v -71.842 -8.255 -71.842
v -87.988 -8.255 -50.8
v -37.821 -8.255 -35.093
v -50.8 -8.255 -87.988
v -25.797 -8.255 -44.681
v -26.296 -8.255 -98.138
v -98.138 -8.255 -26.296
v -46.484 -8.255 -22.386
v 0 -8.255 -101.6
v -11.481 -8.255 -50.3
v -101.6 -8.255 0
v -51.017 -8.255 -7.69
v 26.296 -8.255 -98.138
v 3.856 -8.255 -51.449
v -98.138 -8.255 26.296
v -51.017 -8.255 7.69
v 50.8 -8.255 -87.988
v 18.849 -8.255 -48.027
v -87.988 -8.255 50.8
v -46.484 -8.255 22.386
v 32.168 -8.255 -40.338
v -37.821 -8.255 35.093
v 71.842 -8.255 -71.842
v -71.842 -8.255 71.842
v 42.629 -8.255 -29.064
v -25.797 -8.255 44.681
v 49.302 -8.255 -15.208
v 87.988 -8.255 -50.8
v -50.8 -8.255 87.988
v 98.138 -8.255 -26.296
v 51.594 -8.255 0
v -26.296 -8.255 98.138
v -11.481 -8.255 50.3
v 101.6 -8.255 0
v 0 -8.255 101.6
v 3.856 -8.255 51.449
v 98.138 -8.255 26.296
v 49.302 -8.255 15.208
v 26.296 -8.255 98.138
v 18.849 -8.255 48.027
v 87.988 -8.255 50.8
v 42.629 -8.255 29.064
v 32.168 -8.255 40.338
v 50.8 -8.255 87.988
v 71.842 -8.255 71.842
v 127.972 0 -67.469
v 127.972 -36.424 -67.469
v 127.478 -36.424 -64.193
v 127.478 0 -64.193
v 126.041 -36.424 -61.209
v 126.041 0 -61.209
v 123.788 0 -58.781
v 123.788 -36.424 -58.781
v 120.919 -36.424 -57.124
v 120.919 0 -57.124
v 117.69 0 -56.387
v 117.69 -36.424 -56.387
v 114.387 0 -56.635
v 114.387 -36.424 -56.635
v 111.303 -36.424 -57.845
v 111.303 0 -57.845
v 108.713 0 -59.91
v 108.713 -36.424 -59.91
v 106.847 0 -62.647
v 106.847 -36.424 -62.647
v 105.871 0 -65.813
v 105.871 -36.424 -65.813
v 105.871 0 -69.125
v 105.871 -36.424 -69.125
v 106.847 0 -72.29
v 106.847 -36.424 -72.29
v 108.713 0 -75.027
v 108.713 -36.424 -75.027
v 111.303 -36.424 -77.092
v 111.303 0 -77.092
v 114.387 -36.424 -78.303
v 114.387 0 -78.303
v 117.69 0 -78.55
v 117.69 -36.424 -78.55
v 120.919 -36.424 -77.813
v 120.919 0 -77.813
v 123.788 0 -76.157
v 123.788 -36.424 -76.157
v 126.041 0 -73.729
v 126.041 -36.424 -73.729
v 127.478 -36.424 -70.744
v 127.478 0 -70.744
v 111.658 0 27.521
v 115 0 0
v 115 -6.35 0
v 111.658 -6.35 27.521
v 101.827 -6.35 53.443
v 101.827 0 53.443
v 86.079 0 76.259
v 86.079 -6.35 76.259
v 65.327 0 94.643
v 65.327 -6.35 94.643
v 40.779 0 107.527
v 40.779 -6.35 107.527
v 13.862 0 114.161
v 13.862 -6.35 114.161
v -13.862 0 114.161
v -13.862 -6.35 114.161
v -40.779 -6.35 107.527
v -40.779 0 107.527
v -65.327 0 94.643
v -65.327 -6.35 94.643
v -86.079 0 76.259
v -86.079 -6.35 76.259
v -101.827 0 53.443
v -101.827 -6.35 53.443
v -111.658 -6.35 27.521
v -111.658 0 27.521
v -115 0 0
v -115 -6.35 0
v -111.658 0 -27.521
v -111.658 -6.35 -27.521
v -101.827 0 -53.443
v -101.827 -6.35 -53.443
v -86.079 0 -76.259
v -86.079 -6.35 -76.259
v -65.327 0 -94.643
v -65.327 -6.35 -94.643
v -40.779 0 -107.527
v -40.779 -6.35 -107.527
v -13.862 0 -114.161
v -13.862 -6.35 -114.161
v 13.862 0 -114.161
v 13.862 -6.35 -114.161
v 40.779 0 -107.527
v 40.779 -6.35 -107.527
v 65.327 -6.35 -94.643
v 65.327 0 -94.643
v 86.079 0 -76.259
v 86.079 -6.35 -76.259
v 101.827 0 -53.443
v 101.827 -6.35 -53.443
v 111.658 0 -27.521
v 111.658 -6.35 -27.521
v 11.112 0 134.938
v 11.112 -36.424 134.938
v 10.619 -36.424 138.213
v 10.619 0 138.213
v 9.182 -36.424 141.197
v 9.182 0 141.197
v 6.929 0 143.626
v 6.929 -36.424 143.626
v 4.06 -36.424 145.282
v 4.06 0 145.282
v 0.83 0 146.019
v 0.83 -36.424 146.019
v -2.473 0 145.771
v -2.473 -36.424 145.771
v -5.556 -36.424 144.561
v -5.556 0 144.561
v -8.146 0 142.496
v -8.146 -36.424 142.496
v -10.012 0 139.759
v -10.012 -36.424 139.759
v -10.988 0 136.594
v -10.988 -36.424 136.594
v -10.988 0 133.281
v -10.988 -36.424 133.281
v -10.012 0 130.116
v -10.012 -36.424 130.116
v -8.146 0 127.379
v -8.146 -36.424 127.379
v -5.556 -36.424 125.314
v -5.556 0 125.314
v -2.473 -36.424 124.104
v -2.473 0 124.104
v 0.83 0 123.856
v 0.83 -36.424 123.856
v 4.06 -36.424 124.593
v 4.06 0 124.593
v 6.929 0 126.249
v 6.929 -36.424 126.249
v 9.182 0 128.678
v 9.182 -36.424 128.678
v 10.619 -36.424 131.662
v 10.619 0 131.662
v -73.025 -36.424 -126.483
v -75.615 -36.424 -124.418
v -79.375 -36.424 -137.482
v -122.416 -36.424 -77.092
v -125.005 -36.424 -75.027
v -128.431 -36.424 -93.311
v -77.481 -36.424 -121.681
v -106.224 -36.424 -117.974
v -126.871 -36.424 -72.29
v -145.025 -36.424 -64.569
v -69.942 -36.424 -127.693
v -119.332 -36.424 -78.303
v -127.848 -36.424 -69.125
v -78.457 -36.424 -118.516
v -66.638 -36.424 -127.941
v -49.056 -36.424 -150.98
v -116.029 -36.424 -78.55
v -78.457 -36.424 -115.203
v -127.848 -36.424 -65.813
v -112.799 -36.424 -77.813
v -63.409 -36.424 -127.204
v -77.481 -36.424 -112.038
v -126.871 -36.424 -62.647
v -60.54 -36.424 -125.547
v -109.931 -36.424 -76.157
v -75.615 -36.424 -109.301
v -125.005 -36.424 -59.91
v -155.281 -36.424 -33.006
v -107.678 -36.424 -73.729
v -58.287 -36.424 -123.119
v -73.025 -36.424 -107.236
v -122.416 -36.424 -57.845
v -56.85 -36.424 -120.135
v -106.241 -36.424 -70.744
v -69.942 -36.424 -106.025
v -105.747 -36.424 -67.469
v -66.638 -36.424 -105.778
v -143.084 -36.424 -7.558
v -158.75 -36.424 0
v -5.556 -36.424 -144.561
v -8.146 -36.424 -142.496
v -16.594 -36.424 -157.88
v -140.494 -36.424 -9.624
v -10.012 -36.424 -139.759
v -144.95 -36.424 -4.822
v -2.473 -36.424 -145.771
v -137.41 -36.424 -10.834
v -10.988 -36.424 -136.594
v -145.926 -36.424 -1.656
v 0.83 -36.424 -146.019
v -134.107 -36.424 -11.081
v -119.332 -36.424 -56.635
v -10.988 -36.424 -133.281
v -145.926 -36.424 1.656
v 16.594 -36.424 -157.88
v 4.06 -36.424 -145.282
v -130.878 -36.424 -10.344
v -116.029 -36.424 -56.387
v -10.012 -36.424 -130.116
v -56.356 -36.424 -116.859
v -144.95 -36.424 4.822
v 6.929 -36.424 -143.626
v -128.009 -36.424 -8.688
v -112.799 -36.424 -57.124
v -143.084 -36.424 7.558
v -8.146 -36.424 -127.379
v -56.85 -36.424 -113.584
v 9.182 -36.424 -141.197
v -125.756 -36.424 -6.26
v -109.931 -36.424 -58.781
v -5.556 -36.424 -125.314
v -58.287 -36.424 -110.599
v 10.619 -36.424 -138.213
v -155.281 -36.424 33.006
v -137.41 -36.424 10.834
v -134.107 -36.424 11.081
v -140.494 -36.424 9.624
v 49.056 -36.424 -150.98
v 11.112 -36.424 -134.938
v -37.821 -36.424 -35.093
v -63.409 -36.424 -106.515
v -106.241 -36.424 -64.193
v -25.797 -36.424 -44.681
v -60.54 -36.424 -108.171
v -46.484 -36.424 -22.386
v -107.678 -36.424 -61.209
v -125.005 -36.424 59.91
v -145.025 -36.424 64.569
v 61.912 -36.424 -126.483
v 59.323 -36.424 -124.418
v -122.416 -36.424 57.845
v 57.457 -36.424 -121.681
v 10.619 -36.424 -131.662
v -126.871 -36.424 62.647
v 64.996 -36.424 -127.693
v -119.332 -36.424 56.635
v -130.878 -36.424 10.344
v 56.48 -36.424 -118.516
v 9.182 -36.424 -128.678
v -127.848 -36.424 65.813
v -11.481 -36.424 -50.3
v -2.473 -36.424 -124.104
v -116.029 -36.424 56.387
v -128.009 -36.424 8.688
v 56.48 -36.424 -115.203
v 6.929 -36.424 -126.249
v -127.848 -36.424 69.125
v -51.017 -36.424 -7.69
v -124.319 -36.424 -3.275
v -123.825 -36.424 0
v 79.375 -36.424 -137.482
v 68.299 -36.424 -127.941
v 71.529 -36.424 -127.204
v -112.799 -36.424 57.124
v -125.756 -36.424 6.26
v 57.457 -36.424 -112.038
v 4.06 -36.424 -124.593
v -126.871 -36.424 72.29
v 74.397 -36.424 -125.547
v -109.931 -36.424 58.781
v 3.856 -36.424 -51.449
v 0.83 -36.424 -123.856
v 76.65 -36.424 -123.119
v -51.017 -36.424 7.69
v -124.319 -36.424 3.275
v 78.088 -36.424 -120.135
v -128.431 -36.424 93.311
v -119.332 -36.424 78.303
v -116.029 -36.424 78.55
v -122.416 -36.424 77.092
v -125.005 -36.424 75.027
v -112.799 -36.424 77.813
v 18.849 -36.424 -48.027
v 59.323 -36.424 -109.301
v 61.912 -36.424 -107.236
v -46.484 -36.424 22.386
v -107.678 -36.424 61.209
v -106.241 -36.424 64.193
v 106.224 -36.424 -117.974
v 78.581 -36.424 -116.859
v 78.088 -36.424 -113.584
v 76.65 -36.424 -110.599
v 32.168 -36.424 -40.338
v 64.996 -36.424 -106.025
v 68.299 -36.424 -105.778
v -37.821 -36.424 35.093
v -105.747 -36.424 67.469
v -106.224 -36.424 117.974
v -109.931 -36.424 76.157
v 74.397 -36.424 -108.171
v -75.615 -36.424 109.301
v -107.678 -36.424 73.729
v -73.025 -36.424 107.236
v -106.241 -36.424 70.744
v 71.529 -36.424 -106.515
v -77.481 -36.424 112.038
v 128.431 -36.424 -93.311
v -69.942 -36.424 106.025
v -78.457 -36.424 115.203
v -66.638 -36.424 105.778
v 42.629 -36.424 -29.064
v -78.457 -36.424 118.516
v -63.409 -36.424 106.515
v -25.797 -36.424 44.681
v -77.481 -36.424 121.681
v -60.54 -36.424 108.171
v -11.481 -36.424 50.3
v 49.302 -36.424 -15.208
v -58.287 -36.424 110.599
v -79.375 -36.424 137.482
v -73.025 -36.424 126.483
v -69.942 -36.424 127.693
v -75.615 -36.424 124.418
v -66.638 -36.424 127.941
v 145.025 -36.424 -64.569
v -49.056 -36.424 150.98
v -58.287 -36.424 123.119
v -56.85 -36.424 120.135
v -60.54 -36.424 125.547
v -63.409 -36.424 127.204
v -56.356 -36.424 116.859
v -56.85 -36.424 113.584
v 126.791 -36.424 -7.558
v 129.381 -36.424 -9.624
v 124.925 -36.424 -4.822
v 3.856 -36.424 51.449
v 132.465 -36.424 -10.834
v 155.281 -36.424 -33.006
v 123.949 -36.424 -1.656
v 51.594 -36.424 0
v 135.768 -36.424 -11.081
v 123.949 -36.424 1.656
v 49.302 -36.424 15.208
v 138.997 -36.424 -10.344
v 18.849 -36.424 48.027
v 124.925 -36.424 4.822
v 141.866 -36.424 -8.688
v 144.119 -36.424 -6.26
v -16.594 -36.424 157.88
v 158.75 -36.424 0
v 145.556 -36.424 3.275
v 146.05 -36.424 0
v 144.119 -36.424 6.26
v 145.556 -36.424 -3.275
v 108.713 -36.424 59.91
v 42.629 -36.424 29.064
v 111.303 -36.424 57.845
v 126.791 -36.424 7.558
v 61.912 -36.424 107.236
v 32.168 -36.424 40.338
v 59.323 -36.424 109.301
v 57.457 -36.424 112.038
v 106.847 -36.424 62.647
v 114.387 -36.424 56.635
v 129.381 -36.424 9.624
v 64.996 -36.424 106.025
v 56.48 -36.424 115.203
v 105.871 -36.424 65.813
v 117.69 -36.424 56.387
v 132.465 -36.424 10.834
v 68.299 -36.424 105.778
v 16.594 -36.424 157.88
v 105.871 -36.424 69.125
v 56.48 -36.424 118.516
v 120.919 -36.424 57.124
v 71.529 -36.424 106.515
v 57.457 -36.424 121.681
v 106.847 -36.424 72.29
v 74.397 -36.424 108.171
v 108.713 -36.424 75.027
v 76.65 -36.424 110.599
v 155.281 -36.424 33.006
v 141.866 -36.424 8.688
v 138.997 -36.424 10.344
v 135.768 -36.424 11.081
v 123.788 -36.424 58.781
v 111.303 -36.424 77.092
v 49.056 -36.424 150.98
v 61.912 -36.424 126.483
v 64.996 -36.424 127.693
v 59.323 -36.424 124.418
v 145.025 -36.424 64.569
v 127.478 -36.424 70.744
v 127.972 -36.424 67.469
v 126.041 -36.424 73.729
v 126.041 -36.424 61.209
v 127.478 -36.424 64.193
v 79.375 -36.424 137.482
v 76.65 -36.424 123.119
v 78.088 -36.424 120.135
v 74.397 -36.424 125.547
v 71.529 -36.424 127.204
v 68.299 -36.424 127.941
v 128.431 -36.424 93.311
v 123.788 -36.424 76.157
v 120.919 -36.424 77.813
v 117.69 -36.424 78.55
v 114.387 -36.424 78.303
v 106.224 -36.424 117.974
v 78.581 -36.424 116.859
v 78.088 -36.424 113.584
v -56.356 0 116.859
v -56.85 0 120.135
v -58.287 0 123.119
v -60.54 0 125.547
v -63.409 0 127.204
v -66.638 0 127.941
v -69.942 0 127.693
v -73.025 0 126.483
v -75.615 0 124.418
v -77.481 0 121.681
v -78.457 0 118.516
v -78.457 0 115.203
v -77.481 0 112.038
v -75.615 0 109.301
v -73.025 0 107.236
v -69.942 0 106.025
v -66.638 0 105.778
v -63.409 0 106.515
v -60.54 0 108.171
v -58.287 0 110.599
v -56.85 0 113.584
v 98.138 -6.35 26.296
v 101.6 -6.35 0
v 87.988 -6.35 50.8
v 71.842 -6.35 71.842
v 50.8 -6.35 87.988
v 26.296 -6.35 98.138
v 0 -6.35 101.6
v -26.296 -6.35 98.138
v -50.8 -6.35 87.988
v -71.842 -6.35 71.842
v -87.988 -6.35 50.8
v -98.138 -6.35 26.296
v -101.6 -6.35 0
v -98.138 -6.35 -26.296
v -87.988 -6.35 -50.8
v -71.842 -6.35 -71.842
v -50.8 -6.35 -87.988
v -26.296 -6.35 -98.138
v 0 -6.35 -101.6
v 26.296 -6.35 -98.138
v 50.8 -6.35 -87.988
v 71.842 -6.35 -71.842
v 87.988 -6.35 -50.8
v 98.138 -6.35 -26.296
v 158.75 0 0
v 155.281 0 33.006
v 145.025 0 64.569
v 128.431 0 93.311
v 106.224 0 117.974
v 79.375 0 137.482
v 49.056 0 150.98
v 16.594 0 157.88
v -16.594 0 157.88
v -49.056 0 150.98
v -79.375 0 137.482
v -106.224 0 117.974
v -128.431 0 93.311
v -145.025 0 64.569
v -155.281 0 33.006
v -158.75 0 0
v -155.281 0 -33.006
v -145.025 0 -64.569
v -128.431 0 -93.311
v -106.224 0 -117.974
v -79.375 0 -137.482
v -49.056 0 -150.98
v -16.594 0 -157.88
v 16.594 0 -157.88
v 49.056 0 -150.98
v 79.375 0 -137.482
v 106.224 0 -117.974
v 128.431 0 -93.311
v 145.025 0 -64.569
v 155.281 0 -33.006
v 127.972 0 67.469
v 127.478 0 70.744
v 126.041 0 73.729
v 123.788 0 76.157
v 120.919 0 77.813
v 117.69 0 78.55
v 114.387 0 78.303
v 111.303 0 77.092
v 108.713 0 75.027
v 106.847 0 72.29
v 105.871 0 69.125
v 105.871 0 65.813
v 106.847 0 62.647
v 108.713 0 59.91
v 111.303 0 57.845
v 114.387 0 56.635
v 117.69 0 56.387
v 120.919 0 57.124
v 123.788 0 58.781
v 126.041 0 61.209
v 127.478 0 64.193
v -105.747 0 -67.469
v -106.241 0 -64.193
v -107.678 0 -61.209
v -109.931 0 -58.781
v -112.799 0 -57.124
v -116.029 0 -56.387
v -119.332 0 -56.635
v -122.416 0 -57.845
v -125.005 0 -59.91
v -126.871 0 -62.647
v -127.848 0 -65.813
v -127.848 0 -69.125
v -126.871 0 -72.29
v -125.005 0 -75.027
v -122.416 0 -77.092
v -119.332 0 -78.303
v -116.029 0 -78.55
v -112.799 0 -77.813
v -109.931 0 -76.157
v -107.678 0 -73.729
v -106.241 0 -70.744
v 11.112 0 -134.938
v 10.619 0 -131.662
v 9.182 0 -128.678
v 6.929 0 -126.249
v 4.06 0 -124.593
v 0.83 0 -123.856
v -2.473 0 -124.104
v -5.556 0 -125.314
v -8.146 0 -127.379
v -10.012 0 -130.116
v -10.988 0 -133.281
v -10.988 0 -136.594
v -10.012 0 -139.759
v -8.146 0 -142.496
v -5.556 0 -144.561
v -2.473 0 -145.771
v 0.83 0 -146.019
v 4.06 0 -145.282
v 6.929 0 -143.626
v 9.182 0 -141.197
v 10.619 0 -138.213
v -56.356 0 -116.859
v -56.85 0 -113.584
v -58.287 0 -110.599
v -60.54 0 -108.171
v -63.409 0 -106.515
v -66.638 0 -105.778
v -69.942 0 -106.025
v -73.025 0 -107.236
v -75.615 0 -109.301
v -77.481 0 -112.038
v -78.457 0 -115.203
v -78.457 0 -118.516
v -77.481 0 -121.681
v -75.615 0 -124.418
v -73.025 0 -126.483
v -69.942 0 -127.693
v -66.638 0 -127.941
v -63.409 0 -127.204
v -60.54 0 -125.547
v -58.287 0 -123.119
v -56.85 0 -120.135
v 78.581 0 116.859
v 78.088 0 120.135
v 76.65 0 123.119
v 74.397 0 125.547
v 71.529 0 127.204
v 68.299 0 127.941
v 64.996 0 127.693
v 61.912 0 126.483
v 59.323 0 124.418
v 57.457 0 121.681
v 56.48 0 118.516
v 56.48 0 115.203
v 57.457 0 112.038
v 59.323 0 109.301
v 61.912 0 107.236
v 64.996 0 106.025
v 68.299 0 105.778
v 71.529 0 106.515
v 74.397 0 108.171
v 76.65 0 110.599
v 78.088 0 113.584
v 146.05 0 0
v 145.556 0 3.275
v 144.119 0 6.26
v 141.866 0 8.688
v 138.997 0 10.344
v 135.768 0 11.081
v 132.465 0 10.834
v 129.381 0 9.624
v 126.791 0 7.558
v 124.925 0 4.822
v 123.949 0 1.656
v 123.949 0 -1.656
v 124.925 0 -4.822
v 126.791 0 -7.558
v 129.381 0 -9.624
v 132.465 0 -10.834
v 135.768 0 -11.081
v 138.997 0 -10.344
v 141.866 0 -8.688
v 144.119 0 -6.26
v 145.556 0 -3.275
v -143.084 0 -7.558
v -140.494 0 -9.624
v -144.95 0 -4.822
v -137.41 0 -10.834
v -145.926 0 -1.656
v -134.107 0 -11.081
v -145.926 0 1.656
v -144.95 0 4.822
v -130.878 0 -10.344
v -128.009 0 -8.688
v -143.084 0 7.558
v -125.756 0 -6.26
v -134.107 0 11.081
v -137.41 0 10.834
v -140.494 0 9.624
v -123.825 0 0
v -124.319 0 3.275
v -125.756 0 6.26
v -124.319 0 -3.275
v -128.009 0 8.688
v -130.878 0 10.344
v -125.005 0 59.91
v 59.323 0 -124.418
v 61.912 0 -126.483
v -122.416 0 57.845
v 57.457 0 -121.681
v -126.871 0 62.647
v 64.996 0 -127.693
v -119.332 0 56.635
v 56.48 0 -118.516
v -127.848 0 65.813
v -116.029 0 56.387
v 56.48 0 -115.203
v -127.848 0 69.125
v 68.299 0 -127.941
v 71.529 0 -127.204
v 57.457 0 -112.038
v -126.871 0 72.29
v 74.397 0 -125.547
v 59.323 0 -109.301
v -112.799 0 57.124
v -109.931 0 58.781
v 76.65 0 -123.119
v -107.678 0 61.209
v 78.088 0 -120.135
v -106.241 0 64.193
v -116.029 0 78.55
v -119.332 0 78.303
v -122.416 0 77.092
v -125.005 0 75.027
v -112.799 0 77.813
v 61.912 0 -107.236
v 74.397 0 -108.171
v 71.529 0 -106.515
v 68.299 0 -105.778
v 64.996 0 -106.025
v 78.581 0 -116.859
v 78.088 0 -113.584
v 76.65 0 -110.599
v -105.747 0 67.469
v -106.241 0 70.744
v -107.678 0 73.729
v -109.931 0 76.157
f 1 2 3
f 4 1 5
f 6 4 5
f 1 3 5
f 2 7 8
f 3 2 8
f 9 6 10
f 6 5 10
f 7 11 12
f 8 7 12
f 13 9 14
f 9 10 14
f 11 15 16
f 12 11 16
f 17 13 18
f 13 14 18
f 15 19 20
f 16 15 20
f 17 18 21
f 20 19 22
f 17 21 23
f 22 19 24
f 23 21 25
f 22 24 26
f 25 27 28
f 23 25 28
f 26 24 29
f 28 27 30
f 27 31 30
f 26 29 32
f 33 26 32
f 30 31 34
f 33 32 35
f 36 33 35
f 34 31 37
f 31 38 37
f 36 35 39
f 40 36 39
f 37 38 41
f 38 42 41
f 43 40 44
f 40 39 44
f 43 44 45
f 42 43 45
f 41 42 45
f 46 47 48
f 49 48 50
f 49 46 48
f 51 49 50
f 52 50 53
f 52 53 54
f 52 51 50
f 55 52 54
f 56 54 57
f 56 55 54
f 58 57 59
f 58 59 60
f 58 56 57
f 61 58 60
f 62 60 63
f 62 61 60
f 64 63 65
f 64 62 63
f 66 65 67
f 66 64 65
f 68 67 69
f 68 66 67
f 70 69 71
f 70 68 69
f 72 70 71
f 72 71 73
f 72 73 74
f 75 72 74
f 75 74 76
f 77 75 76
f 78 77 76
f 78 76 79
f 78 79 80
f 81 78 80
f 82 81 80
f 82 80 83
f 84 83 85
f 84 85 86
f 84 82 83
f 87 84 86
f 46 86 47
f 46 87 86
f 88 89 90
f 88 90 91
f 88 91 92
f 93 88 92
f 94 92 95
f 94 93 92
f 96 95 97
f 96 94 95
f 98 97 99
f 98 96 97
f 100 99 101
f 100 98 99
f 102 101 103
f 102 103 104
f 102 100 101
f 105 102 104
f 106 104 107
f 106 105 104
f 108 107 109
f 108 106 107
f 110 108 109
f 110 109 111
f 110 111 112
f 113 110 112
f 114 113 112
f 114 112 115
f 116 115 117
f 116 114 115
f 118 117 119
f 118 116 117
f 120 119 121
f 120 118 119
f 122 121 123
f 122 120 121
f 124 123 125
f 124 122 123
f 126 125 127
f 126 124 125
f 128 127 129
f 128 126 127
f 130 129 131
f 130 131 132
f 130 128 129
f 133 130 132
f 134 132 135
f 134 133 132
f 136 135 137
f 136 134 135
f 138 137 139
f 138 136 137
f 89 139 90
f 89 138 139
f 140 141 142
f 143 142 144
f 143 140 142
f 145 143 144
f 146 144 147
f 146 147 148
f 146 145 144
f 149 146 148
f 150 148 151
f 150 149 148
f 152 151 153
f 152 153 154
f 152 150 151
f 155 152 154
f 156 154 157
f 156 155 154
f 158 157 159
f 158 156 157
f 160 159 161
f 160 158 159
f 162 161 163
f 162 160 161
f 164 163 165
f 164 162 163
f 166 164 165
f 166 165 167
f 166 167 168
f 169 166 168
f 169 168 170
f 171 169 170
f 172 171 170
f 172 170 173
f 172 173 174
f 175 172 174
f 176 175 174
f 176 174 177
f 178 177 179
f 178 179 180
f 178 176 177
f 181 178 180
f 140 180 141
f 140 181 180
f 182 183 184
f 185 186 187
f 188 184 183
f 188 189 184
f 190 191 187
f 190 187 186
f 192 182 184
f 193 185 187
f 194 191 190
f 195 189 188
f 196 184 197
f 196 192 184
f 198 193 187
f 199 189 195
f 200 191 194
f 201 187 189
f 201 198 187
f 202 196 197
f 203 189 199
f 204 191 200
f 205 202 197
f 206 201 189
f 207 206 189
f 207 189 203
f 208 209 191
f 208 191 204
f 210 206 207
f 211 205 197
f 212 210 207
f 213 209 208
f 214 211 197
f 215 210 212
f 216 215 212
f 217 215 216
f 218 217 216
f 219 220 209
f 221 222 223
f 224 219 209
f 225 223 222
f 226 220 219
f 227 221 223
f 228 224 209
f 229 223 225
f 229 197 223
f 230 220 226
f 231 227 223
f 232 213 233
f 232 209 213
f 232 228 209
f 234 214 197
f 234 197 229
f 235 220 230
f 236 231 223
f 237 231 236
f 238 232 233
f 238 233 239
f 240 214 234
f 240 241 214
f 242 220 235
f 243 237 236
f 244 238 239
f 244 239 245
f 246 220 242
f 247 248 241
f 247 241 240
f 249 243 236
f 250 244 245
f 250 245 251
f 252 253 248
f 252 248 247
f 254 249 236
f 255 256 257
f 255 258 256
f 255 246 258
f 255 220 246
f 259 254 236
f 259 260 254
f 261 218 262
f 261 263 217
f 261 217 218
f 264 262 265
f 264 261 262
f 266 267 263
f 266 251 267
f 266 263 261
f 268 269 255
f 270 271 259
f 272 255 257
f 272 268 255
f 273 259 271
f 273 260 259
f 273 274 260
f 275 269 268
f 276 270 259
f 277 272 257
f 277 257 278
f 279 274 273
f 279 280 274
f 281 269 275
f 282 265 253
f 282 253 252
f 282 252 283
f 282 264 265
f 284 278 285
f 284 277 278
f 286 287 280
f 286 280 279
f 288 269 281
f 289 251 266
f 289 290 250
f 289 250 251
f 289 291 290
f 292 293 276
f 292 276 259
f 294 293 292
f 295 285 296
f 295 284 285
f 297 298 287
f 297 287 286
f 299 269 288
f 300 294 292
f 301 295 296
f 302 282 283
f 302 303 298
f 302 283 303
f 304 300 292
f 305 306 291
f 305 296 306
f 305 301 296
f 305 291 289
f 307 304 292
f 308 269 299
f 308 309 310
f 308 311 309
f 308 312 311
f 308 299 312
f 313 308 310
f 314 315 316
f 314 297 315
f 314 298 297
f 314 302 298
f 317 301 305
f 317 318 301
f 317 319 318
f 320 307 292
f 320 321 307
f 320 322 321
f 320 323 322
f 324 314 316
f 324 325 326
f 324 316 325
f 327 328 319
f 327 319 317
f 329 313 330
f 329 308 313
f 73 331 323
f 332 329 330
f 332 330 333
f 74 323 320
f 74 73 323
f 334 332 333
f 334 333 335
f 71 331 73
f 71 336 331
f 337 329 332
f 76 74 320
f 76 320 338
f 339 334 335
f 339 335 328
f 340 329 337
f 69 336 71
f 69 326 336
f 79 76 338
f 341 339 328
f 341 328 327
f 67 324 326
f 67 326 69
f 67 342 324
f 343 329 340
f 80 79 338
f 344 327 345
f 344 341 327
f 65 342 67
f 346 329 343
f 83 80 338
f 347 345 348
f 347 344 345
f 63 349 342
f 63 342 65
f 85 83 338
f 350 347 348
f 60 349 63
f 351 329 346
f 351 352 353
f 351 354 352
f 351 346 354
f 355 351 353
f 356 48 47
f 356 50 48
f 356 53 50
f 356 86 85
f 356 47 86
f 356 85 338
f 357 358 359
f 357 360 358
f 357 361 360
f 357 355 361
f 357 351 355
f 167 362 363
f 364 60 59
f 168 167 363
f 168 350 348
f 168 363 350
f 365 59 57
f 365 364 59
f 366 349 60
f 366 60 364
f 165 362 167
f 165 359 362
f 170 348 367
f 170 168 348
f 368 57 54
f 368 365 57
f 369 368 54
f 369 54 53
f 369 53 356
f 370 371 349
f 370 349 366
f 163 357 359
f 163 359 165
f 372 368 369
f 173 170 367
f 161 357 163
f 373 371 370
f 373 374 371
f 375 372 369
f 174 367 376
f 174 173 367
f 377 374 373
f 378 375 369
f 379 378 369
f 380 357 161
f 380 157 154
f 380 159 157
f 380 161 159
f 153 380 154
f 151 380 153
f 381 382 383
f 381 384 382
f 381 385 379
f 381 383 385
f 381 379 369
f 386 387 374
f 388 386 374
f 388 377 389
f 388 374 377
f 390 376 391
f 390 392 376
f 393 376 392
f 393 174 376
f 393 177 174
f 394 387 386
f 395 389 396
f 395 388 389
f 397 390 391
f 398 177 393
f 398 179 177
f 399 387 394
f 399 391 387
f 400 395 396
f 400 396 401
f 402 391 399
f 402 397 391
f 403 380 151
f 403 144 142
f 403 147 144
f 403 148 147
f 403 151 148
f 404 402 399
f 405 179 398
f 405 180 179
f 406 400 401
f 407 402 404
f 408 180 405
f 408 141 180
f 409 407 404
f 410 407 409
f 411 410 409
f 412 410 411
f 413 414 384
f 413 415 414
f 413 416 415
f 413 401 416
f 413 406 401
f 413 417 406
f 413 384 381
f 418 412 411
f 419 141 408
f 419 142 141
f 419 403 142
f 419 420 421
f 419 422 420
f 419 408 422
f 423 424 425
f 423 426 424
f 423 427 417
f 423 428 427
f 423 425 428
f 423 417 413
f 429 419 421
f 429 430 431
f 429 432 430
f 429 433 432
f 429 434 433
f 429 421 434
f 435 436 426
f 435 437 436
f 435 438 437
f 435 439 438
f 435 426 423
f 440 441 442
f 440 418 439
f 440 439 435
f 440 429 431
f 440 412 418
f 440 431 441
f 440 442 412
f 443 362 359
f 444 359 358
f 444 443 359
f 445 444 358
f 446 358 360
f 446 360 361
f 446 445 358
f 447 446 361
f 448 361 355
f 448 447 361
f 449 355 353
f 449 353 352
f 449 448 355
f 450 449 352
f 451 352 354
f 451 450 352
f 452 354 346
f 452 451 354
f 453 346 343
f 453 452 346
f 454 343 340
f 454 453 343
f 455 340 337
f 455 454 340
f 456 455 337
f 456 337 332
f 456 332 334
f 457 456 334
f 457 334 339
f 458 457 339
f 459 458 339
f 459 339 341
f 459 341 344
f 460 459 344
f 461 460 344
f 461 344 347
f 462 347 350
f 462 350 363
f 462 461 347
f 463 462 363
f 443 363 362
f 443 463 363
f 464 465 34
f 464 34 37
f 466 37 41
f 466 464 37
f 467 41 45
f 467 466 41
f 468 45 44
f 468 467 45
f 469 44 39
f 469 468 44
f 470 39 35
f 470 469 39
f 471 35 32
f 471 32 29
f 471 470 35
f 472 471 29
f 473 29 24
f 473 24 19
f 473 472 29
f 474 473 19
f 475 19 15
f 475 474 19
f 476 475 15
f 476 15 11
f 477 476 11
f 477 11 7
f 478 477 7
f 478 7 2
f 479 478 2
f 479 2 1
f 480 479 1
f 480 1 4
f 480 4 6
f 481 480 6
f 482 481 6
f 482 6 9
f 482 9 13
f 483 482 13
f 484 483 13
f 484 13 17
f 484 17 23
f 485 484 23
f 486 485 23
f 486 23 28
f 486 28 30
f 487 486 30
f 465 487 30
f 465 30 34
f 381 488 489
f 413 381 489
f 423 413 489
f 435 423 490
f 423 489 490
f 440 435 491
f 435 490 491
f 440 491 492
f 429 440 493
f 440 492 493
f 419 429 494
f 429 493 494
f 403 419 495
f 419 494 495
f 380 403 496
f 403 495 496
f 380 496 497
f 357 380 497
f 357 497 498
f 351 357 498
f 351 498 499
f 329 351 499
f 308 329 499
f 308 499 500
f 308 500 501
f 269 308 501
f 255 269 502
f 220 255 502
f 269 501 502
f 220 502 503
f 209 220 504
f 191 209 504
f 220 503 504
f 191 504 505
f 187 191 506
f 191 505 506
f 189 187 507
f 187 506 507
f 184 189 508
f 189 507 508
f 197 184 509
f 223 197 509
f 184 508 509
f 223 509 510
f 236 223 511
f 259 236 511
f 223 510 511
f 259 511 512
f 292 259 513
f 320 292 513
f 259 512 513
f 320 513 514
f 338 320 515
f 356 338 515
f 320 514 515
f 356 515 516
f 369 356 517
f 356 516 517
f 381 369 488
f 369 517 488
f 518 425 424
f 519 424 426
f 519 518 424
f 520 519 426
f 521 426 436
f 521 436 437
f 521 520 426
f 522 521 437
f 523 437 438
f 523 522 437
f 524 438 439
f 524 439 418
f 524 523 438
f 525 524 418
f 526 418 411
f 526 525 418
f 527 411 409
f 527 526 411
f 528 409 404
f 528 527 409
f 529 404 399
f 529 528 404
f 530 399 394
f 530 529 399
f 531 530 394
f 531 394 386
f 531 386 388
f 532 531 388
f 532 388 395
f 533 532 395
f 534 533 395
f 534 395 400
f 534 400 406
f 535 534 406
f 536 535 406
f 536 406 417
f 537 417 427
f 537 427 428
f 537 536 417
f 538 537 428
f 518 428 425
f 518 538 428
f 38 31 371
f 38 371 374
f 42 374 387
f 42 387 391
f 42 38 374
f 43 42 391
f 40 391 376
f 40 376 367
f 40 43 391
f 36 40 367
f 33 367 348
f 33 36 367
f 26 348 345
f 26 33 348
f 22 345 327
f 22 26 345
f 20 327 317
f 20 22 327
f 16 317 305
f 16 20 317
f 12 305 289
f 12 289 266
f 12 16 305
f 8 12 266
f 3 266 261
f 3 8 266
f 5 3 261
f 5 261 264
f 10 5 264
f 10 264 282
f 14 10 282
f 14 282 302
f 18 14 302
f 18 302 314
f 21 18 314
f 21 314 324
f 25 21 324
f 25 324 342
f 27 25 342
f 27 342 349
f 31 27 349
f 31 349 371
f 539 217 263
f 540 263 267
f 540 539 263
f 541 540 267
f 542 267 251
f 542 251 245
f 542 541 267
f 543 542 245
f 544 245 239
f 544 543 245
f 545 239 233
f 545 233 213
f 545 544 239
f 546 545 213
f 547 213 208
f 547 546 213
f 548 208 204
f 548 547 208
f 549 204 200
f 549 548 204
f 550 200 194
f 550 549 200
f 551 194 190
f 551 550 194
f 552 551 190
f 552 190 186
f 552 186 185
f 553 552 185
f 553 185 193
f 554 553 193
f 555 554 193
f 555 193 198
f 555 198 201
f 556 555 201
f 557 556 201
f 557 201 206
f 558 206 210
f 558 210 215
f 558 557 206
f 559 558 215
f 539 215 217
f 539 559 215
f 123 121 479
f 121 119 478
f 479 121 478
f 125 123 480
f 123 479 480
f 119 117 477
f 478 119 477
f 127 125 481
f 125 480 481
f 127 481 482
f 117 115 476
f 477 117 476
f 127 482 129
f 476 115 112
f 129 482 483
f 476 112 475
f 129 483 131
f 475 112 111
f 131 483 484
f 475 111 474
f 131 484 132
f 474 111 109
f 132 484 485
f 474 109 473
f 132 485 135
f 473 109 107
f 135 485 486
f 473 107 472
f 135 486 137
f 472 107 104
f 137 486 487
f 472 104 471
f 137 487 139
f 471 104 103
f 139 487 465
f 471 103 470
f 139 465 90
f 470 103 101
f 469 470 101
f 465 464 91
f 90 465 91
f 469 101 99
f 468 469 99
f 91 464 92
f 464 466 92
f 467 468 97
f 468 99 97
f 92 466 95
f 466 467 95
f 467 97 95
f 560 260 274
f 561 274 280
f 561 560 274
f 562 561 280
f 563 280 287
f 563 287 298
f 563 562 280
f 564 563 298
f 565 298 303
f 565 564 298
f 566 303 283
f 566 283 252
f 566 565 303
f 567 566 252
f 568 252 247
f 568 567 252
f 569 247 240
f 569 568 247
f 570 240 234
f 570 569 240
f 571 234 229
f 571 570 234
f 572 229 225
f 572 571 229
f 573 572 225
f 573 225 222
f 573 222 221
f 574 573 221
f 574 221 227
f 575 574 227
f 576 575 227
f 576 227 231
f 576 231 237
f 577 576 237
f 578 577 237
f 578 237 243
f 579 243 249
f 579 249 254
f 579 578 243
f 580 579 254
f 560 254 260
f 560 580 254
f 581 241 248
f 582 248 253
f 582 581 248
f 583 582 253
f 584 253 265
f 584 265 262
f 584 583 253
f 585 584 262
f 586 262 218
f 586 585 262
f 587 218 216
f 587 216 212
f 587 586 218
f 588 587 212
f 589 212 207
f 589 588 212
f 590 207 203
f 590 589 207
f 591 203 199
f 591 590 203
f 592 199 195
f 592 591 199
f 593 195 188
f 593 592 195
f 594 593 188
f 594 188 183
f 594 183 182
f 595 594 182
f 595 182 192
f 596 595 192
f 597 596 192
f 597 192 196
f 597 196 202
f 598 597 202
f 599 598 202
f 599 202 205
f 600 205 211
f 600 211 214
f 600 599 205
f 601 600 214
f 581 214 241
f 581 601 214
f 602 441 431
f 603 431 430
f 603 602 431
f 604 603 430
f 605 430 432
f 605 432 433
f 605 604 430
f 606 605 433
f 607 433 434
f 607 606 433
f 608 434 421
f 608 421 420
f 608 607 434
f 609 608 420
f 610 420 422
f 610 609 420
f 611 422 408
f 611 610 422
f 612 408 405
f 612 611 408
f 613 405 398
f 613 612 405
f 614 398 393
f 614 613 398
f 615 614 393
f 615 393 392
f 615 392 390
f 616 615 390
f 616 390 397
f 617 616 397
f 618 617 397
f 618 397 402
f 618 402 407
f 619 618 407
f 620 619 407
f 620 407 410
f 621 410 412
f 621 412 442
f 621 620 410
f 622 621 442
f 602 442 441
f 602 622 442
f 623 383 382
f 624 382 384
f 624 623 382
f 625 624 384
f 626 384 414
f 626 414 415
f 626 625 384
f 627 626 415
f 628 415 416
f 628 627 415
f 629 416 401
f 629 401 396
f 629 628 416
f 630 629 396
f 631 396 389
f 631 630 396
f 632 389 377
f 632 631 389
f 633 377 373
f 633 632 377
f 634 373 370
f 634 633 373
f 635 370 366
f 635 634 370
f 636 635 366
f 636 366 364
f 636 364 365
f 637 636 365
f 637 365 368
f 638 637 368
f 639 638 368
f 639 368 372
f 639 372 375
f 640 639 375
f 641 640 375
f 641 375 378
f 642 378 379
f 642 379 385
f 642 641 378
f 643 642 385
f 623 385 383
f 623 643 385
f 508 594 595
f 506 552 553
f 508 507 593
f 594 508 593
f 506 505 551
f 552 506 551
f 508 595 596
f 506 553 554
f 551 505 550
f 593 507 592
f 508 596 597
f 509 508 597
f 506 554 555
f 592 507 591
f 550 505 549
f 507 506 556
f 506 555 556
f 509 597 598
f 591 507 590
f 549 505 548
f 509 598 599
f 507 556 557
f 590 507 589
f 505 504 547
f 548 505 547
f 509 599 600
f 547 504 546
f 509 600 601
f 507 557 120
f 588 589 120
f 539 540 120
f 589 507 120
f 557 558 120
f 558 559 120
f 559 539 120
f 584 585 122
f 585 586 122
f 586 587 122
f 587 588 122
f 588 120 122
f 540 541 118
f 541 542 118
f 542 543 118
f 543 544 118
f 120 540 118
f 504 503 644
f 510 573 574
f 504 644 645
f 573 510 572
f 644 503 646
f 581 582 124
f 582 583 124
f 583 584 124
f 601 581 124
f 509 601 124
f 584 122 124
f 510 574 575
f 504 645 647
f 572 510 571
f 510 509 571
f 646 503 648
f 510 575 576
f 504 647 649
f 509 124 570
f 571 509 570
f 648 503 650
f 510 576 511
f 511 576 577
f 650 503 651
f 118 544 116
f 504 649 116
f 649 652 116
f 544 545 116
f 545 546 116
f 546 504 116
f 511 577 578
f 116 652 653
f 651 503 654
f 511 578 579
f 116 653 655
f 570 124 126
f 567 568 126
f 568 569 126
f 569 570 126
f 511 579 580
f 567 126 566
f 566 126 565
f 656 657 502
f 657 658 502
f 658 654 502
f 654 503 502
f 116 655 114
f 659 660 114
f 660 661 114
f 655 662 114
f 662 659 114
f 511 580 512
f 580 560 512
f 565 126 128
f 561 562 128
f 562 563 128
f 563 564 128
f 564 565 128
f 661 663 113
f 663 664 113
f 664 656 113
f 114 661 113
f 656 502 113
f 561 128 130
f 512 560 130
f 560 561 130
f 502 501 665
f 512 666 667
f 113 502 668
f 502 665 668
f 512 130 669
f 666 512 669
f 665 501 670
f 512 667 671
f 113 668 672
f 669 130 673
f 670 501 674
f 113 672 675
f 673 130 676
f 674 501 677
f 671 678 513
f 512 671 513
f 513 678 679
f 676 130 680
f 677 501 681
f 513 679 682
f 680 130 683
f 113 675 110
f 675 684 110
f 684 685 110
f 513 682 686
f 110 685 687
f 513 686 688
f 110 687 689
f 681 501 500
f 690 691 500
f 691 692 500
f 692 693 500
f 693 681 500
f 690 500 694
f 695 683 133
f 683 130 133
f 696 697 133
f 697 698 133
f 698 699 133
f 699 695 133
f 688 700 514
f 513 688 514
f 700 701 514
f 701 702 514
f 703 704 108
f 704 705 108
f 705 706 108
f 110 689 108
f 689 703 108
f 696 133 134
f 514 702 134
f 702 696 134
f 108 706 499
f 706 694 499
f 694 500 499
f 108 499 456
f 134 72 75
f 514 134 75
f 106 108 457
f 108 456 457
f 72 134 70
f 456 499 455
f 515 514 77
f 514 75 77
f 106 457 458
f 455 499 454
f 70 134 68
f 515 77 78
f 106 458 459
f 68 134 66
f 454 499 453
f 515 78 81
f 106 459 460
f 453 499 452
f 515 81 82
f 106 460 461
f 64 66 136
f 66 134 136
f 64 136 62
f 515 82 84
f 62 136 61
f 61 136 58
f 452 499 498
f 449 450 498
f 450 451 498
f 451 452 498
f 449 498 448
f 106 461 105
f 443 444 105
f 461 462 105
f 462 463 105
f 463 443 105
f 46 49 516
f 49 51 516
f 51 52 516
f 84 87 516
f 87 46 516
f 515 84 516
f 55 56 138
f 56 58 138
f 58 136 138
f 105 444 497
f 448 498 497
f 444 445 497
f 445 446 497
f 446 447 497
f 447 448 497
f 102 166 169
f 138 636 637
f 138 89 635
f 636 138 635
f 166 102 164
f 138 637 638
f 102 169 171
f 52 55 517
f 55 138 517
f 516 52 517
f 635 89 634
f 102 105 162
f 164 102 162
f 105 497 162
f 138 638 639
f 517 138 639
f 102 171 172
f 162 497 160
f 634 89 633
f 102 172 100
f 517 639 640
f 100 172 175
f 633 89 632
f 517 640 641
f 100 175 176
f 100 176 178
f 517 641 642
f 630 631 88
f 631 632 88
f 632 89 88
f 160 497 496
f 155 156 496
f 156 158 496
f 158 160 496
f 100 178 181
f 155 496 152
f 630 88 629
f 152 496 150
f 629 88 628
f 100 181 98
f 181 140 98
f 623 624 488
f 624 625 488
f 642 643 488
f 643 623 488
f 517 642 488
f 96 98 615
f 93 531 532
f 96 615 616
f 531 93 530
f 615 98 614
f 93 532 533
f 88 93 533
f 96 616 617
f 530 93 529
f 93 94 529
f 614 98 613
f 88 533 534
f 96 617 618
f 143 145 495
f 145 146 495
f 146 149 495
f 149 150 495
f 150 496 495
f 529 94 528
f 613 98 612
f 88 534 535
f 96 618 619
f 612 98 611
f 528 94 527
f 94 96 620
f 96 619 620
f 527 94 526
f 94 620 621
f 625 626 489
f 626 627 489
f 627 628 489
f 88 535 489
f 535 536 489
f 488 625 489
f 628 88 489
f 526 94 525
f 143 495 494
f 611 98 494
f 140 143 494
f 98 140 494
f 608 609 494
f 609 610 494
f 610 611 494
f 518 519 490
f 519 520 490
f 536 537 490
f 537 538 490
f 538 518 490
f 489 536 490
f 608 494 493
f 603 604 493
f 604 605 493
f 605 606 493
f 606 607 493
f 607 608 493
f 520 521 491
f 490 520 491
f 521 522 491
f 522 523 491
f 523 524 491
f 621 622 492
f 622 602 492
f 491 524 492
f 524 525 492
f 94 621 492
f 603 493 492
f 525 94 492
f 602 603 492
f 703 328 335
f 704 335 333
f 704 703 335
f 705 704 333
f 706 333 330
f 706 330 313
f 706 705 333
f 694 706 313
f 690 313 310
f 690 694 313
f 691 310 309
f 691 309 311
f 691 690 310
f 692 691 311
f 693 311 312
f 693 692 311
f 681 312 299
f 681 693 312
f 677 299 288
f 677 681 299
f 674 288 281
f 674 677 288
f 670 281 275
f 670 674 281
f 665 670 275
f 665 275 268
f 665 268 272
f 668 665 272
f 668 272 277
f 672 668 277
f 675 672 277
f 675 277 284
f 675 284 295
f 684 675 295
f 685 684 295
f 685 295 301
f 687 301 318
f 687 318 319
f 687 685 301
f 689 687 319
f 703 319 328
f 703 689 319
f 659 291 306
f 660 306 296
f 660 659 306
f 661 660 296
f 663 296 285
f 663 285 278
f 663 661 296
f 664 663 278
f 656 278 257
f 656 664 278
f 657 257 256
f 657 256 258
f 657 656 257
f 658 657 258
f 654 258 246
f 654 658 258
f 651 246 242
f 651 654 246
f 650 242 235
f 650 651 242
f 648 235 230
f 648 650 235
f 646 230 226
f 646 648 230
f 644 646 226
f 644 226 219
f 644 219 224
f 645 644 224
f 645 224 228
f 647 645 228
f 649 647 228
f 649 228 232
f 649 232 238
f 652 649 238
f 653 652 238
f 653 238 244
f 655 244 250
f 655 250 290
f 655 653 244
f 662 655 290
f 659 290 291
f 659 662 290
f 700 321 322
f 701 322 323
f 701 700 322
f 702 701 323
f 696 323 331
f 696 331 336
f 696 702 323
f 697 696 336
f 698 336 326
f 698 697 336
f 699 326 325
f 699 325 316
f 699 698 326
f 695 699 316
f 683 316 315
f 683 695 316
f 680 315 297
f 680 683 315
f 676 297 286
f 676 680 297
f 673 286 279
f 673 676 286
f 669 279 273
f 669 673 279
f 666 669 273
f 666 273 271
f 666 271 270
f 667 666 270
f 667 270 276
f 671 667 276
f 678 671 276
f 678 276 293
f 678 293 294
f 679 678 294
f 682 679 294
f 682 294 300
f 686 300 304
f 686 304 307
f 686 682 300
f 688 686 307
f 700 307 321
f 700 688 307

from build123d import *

# Parameters (mm, degrees)
F0_R     = 158.75
F0_R_2   = 11.1125
F1_DEPTH = 36.4236
F2_R     = 114.99977
F2_R_2   = 101.6
F3_DEPTH = 6.35
F2_R_3   = 51.59375
F4_DEPTH = 8.255
F5_DEPTH = 36.4236


with BuildPart() as f1:
    # F0 (on Front) → F1 (new body)
    with BuildSketch(Plane.XZ):
        Circle(F0_R)
        with Locations((-67.46875, -116.859303)):
            Circle(F0_R_2, mode=Mode.SUBTRACT)
        with Locations((-116.859303, -67.46875)):
            Circle(F0_R_2, mode=Mode.SUBTRACT)
        with Locations((0, -134.9375)):
            Circle(F0_R_2, mode=Mode.SUBTRACT)
        with Locations((67.46875, -116.859303)):
            Circle(F0_R_2, mode=Mode.SUBTRACT)
        with Locations((116.859303, -67.46875)):
            Circle(F0_R_2, mode=Mode.SUBTRACT)
        with Locations((-134.9375, 0)):
            Circle(F0_R_2, mode=Mode.SUBTRACT)
        with Locations((-116.859303, 67.46875)):
            Circle(F0_R_2, mode=Mode.SUBTRACT)
        with Locations((-67.46875, 116.859303)):
            Circle(F0_R_2, mode=Mode.SUBTRACT)
        with Locations((134.9375, 0)):
            Circle(F0_R_2, mode=Mode.SUBTRACT)
        with Locations((116.859303, 67.46875)):
            Circle(F0_R_2, mode=Mode.SUBTRACT)
        with Locations((67.46875, 116.859303)):
            Circle(F0_R_2, mode=Mode.SUBTRACT)
        with Locations((0, 134.9375)):
            Circle(F0_R_2, mode=Mode.SUBTRACT)
    extrude(amount=F1_DEPTH)

    # F2 (on face) → F3 (cut)
    with BuildSketch(Plane.XZ):
        Circle(F2_R)
        Circle(F2_R_2, mode=Mode.SUBTRACT)
    extrude(amount=F3_DEPTH, mode=Mode.SUBTRACT)

    # F2 (on face) → F4 (cut)
    with BuildSketch(Plane.XZ):
        Circle(F2_R_2)
        Circle(F2_R_3, mode=Mode.SUBTRACT)
    extrude(amount=F4_DEPTH, mode=Mode.SUBTRACT)

    # F2 (on face) → F5 (cut)
    with BuildSketch(Plane.XZ):
        Circle(F2_R_3)
    extrude(amount=F5_DEPTH, mode=Mode.SUBTRACT)


solid = f1.part
